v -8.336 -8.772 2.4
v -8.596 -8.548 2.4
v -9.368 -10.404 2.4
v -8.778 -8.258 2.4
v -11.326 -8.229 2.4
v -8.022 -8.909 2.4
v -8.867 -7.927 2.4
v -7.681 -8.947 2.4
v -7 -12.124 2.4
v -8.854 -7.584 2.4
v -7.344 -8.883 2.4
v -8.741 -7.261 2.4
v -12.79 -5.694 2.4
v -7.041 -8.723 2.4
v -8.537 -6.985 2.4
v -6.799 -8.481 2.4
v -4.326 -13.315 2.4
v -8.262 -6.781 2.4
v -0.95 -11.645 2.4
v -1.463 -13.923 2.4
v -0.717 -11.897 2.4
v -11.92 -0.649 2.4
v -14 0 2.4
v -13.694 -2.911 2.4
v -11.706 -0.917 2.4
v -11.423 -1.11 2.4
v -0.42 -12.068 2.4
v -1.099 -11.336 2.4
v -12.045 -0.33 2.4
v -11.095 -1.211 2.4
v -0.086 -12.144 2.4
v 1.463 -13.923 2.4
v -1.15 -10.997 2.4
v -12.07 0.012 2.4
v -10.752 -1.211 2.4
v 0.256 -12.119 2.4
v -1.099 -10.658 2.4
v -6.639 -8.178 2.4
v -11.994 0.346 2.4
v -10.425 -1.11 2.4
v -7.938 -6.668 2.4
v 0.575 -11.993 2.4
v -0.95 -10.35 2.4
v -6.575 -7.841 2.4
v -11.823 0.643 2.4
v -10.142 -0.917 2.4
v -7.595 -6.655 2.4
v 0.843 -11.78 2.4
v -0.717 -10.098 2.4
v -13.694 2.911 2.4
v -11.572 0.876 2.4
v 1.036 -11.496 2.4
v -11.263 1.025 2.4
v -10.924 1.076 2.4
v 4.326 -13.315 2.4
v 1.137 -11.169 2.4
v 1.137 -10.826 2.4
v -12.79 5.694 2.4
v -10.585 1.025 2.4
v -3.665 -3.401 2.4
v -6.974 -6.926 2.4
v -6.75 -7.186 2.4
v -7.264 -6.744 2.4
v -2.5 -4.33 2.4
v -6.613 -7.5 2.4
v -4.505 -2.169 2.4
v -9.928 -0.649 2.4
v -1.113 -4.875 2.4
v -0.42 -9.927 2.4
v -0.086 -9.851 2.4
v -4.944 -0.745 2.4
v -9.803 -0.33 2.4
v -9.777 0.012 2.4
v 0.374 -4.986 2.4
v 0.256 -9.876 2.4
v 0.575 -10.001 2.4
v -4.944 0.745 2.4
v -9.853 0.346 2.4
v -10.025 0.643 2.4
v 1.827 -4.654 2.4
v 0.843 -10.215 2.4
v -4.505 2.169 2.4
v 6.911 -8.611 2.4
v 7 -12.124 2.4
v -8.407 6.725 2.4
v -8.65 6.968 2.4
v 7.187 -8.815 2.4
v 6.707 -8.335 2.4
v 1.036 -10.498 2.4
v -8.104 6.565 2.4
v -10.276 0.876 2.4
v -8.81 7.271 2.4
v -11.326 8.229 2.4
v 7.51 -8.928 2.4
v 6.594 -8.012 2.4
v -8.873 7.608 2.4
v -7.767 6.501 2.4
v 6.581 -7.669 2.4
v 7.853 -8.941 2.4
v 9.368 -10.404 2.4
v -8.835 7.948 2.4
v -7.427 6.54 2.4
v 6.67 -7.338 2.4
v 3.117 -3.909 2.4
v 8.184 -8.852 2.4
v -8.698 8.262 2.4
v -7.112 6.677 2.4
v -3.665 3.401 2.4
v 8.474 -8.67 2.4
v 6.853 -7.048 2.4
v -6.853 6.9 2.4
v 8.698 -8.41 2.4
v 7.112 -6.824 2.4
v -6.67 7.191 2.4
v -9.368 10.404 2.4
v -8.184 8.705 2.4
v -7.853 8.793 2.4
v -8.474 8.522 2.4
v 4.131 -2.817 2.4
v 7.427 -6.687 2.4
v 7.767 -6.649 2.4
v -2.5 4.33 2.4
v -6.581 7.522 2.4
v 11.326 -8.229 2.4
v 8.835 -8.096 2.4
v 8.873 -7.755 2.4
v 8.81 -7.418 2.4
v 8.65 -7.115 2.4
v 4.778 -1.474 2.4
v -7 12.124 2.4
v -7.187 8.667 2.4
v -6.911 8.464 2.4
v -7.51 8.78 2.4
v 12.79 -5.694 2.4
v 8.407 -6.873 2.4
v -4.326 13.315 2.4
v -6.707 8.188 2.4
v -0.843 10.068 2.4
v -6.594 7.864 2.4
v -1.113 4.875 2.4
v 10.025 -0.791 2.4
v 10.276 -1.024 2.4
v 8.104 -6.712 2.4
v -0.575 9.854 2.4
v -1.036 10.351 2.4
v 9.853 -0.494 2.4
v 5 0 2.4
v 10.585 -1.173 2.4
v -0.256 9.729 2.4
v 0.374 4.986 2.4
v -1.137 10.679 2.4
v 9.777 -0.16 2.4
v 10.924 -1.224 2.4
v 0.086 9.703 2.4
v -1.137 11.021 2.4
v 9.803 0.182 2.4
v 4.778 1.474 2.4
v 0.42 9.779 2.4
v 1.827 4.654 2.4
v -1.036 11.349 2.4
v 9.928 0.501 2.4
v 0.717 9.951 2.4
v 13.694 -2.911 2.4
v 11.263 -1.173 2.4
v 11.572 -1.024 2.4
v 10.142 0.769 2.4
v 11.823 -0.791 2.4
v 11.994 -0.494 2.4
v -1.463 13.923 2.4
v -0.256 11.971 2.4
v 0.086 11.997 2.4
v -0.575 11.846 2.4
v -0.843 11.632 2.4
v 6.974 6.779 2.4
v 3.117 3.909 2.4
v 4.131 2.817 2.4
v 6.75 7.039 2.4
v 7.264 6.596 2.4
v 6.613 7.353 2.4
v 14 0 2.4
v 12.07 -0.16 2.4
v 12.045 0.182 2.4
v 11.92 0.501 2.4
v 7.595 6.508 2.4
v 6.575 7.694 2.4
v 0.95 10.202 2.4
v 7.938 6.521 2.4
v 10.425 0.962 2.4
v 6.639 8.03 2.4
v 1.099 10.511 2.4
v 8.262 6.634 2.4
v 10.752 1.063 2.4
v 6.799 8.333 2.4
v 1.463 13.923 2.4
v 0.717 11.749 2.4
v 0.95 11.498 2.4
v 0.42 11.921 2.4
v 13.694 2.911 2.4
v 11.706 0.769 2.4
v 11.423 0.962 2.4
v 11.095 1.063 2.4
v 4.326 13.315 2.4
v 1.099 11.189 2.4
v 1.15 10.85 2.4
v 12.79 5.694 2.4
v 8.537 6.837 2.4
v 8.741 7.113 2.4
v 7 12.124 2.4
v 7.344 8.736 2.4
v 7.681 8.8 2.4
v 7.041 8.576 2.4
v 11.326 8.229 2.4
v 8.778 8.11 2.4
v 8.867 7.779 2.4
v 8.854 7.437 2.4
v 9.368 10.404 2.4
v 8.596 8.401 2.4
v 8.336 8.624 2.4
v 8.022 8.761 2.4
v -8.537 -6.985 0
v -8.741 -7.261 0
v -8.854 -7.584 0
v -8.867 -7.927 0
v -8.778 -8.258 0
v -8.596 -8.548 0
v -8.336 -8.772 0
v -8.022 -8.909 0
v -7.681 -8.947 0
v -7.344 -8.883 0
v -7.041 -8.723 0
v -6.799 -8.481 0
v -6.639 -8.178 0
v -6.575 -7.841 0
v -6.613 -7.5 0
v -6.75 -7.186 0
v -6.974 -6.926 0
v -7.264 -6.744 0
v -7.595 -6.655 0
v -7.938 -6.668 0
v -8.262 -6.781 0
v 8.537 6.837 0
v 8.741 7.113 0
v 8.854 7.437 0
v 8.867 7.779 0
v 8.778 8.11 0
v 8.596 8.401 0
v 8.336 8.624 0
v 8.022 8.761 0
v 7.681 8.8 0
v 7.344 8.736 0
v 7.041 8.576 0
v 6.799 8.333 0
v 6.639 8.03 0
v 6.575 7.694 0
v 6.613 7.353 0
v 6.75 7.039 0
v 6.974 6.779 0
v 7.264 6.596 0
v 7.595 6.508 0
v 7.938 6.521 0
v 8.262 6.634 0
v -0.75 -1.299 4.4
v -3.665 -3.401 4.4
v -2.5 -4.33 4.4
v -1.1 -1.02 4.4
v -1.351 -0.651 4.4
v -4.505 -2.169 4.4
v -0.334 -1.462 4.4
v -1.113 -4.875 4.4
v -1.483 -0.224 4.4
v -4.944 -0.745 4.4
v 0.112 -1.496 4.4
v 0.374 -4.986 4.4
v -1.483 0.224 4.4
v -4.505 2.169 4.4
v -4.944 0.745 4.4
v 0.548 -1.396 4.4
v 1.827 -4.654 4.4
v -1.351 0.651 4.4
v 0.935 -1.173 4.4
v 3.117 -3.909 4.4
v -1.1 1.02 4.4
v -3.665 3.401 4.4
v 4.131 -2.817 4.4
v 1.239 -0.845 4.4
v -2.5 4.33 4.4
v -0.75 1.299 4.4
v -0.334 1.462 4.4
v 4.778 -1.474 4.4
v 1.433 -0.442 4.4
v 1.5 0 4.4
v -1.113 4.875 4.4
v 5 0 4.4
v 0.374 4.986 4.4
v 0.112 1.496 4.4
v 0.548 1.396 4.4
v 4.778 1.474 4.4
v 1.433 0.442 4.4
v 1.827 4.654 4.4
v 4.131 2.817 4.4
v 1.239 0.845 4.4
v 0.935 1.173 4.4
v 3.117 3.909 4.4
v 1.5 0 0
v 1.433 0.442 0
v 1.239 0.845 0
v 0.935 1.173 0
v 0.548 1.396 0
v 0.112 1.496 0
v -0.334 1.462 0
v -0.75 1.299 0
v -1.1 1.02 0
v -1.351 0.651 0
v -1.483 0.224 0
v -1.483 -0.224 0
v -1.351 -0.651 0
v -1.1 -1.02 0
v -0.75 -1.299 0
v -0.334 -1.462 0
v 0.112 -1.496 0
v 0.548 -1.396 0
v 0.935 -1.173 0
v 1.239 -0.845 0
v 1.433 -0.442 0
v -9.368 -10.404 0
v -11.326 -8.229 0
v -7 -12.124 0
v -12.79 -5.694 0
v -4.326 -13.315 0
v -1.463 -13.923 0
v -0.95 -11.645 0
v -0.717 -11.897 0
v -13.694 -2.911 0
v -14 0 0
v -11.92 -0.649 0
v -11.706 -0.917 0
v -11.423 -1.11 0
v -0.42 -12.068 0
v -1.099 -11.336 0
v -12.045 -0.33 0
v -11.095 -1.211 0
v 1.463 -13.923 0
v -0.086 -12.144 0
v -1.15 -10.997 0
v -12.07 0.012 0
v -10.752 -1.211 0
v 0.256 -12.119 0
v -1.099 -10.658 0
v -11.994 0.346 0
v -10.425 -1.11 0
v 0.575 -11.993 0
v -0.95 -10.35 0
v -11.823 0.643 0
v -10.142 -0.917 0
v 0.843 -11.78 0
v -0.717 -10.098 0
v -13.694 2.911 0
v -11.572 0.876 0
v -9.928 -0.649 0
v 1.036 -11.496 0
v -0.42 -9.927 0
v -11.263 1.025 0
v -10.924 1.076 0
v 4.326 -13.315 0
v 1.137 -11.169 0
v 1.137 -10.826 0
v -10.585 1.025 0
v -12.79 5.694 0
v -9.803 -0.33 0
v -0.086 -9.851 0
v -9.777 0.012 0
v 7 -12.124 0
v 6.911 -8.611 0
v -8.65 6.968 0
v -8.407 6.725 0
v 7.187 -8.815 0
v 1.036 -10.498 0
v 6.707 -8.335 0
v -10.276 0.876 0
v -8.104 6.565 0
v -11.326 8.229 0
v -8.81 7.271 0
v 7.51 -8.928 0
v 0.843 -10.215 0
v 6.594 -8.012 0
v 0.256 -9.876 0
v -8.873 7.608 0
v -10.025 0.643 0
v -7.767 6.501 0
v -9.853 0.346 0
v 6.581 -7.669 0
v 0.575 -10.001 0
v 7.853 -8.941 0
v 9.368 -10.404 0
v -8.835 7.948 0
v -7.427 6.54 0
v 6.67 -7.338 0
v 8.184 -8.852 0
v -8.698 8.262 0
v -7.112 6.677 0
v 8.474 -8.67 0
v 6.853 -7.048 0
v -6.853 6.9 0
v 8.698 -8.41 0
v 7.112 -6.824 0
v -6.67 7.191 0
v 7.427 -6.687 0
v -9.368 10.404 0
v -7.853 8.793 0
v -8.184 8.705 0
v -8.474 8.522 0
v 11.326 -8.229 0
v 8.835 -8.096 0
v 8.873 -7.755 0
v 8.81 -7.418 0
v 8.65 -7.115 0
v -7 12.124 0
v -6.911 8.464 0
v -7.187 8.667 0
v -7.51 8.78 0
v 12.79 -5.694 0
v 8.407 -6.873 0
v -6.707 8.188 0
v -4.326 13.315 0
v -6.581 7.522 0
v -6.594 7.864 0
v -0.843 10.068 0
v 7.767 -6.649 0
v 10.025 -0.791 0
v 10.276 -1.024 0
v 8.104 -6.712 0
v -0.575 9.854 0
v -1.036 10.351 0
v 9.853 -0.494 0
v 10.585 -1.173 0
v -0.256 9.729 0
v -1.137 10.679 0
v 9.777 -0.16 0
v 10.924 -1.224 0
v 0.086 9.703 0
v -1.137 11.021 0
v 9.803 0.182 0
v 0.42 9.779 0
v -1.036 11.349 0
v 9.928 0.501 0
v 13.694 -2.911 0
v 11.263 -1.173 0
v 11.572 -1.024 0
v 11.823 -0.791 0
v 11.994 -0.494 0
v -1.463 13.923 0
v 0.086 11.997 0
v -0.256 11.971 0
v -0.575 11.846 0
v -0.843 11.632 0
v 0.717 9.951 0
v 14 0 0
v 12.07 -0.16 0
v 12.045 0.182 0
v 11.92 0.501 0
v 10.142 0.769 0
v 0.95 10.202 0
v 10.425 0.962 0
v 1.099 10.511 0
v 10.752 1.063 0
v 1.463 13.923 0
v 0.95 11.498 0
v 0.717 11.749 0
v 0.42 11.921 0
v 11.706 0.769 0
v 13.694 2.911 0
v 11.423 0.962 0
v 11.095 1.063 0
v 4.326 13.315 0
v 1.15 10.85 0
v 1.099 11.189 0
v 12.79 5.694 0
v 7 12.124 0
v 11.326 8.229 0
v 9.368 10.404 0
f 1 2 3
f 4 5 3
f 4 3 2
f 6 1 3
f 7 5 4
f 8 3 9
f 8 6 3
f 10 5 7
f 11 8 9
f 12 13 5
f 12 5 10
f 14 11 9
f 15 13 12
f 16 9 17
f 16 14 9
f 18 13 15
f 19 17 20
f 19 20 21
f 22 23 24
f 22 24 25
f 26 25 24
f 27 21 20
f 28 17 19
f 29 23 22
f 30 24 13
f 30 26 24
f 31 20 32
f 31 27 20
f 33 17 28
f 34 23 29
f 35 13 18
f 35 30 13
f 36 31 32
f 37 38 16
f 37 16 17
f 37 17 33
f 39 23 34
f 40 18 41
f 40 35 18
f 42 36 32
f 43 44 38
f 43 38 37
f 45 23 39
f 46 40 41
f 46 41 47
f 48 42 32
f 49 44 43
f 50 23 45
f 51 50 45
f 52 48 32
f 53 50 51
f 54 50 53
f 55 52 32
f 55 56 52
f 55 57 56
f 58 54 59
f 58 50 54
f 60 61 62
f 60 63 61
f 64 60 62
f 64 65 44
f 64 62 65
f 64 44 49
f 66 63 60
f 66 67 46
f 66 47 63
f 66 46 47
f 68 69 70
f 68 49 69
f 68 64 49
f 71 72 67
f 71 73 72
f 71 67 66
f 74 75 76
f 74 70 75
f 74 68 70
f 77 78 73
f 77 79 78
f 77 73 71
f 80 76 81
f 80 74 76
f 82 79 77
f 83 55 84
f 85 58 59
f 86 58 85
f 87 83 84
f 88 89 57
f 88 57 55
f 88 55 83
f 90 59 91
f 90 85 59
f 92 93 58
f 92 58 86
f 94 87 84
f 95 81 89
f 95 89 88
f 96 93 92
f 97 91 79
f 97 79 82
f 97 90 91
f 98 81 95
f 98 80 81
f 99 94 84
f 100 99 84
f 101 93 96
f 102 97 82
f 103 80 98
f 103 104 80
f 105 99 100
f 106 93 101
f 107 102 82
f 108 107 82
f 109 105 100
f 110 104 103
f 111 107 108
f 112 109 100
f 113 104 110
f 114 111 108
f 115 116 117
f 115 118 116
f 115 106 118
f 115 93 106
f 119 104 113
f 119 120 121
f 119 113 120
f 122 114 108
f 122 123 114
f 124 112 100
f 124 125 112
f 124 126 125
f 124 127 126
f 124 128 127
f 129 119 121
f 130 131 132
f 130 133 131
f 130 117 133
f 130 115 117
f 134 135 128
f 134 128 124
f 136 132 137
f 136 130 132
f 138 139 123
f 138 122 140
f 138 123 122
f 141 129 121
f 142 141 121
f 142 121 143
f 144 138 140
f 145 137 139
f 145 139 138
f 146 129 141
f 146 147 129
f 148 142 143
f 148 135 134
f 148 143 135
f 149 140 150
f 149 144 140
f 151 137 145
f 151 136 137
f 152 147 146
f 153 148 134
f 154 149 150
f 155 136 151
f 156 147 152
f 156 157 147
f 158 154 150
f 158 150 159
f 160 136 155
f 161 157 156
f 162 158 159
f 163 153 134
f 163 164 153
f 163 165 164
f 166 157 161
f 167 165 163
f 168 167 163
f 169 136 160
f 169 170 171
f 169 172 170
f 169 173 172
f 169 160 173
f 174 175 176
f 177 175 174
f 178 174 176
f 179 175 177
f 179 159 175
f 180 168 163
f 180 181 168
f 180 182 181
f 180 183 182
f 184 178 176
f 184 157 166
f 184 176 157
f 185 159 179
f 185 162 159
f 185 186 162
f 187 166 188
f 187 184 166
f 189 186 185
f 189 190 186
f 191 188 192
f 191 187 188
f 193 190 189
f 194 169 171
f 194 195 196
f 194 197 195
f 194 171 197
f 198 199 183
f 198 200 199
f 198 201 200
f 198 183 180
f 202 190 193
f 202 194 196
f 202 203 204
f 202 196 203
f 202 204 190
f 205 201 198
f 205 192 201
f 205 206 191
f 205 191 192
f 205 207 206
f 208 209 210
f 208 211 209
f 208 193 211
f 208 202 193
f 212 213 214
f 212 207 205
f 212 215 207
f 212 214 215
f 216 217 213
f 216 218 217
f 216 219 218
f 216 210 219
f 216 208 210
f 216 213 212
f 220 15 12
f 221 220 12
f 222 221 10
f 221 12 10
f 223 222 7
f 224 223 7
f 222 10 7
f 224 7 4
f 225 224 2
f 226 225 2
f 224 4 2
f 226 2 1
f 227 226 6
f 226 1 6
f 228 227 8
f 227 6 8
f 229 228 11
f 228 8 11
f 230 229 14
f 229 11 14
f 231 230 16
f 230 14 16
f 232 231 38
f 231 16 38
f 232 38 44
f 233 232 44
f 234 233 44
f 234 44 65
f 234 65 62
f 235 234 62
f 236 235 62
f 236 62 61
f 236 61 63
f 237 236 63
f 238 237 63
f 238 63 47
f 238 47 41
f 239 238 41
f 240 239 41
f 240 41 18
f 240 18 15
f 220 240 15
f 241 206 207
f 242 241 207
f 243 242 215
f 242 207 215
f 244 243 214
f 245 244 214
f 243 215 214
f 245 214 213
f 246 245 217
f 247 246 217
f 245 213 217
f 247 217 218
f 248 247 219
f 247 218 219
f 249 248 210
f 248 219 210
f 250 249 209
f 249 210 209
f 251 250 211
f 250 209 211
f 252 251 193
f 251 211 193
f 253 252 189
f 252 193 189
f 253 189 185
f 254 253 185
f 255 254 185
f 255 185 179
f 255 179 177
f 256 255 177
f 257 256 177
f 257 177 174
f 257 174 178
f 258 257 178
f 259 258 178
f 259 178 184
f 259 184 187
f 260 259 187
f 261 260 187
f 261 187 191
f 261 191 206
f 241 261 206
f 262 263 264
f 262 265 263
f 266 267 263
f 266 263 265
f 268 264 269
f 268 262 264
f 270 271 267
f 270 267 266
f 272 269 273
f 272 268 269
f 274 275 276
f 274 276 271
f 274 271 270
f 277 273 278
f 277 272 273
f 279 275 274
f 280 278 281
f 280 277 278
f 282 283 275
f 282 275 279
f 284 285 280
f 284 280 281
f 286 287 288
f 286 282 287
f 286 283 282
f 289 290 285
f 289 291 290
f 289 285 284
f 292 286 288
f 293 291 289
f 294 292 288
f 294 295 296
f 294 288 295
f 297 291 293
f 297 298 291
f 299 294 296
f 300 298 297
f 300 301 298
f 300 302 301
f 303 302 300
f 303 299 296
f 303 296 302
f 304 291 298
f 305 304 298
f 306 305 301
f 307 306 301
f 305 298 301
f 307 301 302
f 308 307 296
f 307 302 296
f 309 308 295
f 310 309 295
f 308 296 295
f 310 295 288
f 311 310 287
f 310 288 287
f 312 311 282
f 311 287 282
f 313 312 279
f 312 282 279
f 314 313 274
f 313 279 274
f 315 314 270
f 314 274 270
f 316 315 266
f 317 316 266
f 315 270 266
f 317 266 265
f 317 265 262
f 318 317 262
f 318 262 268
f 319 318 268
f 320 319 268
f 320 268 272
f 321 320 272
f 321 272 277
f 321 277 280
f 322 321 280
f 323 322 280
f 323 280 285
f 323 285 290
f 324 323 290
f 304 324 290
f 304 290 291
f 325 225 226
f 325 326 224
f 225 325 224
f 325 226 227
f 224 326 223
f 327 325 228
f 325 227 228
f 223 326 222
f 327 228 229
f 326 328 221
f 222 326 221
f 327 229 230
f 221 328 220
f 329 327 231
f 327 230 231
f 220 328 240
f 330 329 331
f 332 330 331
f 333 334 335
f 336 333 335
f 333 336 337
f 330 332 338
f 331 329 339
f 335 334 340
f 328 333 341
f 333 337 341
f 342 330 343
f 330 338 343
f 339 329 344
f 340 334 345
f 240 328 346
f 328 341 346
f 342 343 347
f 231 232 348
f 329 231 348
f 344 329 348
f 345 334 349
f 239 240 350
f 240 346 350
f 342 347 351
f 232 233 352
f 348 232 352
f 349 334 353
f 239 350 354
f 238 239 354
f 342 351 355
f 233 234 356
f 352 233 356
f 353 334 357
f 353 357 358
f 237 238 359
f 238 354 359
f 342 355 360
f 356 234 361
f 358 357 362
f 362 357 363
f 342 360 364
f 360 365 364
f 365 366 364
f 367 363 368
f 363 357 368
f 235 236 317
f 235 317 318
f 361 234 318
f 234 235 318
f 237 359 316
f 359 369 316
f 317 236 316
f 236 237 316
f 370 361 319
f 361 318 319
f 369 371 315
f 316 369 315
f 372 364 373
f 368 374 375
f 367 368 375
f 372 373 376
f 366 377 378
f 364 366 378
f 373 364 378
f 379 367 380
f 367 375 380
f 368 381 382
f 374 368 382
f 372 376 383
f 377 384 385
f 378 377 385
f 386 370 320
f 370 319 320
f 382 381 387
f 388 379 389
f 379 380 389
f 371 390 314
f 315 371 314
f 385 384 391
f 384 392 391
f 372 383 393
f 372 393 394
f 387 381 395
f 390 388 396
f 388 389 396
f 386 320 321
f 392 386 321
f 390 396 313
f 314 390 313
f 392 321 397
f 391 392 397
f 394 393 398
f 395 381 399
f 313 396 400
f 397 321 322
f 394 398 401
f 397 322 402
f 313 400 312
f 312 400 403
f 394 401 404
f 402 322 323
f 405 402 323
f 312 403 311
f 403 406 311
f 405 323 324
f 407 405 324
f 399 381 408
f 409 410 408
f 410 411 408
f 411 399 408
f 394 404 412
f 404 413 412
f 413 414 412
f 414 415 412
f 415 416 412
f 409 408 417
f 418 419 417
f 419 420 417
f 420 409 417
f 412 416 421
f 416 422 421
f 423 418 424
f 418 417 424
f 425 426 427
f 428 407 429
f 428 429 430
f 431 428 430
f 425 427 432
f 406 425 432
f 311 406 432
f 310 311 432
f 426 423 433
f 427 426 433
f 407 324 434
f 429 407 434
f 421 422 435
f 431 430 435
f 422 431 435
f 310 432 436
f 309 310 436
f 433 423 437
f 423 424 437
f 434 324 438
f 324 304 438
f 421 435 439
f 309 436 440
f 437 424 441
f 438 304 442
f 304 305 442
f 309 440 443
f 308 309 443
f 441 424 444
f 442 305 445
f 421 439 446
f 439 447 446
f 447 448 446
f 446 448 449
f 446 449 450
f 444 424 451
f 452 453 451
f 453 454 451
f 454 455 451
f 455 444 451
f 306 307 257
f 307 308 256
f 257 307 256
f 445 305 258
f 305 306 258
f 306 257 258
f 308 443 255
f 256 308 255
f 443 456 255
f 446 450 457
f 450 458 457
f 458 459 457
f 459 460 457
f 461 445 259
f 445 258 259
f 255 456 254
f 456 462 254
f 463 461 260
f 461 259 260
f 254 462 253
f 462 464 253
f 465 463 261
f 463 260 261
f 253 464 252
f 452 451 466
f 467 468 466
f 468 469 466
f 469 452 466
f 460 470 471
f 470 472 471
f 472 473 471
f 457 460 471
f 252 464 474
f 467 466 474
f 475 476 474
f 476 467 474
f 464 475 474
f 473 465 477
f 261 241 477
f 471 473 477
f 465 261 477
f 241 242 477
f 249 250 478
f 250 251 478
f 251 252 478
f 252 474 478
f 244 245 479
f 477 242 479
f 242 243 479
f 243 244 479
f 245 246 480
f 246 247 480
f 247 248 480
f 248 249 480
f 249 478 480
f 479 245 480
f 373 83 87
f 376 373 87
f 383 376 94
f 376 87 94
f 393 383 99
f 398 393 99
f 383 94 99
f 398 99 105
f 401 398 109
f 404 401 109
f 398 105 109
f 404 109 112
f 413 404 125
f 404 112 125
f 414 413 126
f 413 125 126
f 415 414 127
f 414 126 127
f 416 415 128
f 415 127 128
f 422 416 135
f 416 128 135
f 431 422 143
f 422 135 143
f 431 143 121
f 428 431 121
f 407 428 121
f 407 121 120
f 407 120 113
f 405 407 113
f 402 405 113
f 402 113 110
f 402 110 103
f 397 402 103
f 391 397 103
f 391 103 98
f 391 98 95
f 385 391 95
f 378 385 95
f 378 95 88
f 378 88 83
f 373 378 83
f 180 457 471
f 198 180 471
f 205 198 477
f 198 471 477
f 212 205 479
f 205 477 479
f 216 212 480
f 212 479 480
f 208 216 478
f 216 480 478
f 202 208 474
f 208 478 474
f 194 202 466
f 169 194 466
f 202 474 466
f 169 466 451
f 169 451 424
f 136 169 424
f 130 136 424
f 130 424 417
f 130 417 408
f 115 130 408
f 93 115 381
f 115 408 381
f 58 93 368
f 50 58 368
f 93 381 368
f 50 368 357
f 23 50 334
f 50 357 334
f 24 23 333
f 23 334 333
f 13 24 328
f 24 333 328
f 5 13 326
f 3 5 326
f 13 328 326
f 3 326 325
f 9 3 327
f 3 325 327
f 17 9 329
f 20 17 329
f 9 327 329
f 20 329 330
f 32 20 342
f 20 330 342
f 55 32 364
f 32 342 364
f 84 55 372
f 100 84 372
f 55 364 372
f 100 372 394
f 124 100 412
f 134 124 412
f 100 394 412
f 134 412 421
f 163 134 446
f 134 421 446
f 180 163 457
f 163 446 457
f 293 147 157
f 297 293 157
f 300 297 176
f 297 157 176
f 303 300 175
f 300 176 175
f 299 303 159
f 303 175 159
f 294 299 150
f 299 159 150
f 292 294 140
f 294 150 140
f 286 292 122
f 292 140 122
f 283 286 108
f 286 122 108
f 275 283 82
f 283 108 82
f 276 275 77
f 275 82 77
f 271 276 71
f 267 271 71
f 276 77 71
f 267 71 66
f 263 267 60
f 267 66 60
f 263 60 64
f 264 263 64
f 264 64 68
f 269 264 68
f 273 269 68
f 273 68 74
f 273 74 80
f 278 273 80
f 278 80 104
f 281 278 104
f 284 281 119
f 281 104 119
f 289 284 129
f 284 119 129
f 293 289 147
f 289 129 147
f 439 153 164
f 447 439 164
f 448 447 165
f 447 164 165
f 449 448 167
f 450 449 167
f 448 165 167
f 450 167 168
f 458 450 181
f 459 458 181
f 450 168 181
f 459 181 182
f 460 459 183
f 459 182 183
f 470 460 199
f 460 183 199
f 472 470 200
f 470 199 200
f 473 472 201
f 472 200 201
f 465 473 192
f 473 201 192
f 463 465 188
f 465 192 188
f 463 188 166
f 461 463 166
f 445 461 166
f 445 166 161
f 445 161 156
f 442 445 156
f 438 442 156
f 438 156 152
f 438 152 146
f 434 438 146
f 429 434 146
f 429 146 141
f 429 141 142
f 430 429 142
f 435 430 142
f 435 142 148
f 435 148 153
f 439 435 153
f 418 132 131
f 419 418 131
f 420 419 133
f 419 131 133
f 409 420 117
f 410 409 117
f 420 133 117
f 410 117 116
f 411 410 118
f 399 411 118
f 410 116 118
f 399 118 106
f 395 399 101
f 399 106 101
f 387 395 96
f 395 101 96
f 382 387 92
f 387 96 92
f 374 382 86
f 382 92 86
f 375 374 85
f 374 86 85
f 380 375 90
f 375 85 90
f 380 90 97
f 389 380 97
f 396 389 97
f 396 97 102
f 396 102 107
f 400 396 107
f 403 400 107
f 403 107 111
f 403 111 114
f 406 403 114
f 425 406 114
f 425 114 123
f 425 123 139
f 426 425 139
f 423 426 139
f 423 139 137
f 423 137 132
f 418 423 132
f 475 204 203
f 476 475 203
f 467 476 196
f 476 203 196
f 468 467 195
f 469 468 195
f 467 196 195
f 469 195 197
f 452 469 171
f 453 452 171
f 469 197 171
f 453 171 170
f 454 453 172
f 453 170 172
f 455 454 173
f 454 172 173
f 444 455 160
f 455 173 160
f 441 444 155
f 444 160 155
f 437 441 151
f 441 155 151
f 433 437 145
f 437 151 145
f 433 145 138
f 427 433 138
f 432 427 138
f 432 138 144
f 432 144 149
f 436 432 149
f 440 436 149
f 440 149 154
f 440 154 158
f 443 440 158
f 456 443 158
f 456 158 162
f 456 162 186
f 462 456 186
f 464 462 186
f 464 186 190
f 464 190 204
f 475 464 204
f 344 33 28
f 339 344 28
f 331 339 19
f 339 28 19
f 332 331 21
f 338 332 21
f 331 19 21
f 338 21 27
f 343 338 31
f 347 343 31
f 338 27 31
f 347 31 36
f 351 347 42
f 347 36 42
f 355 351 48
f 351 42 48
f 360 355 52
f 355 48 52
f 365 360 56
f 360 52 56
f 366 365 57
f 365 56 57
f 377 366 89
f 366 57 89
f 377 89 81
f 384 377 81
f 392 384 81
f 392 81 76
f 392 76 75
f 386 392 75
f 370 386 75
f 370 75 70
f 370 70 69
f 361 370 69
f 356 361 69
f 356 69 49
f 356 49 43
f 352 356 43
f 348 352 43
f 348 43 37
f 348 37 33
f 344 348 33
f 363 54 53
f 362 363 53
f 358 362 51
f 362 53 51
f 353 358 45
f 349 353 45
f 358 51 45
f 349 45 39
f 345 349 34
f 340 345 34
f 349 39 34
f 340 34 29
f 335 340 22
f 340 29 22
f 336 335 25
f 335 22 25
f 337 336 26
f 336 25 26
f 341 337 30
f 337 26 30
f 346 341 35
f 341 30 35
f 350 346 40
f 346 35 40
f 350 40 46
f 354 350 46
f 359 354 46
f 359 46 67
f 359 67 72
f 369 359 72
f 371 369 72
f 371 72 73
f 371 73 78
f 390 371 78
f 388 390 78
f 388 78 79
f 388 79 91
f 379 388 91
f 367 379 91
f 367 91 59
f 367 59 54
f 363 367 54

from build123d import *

# Parameters (mm, degrees)
SKETCH1_R           = 14
BOSS_EXTRUDE1_DEPTH = 2.4
SKETCH2_R           = 1.15
CUT_EXTRUDE1_DEPTH  = 20.94392138
CIRPATTERN2_COUNT   = 8
SKETCH4_R           = 5
BOSS_EXTRUDE2_DEPTH = 2
SKETCH5_R           = 1.5
CUT_EXTRUDE3_DEPTH  = 21.282011735


with BuildPart() as part:
    # Sketch1 → Boss-Extrude1 (new body)
    with BuildSketch(Plane.XY):
        Circle(SKETCH1_R)
    extrude(amount=BOSS_EXTRUDE1_DEPTH)

    # Sketch2 → Cut-Extrude1 (cut, through all)
    with BuildSketch(Plane.XY.offset(2.4)):
        with Locations((0, 10.85)):
            Circle(SKETCH2_R)
    cut_extrude1 = extrude(amount=-CUT_EXTRUDE1_DEPTH, mode=Mode.SUBTRACT)

    # CirPattern2: Cut-Extrude1 ×8 about axis
    cirpattern2_axis = Axis((0, -0.073707157, 0), (0, 0, 1))
    for i in range(1, CIRPATTERN2_COUNT):
        add(cut_extrude1.rotate(cirpattern2_axis, i * 360 / CIRPATTERN2_COUNT), mode=Mode.SUBTRACT)

    # Sketch4 → Boss-Extrude2 (add)
    with BuildSketch(Plane.XY.offset(2.4)):
        Circle(SKETCH4_R)
    extrude(amount=BOSS_EXTRUDE2_DEPTH)

    # Sketch5 → Cut-Extrude3 (cut, through all)
    with BuildSketch(Plane.XY.offset(4.4)):
        Circle(SKETCH5_R)
    extrude(amount=-CUT_EXTRUDE3_DEPTH, mode=Mode.SUBTRACT)


solid = part.part
